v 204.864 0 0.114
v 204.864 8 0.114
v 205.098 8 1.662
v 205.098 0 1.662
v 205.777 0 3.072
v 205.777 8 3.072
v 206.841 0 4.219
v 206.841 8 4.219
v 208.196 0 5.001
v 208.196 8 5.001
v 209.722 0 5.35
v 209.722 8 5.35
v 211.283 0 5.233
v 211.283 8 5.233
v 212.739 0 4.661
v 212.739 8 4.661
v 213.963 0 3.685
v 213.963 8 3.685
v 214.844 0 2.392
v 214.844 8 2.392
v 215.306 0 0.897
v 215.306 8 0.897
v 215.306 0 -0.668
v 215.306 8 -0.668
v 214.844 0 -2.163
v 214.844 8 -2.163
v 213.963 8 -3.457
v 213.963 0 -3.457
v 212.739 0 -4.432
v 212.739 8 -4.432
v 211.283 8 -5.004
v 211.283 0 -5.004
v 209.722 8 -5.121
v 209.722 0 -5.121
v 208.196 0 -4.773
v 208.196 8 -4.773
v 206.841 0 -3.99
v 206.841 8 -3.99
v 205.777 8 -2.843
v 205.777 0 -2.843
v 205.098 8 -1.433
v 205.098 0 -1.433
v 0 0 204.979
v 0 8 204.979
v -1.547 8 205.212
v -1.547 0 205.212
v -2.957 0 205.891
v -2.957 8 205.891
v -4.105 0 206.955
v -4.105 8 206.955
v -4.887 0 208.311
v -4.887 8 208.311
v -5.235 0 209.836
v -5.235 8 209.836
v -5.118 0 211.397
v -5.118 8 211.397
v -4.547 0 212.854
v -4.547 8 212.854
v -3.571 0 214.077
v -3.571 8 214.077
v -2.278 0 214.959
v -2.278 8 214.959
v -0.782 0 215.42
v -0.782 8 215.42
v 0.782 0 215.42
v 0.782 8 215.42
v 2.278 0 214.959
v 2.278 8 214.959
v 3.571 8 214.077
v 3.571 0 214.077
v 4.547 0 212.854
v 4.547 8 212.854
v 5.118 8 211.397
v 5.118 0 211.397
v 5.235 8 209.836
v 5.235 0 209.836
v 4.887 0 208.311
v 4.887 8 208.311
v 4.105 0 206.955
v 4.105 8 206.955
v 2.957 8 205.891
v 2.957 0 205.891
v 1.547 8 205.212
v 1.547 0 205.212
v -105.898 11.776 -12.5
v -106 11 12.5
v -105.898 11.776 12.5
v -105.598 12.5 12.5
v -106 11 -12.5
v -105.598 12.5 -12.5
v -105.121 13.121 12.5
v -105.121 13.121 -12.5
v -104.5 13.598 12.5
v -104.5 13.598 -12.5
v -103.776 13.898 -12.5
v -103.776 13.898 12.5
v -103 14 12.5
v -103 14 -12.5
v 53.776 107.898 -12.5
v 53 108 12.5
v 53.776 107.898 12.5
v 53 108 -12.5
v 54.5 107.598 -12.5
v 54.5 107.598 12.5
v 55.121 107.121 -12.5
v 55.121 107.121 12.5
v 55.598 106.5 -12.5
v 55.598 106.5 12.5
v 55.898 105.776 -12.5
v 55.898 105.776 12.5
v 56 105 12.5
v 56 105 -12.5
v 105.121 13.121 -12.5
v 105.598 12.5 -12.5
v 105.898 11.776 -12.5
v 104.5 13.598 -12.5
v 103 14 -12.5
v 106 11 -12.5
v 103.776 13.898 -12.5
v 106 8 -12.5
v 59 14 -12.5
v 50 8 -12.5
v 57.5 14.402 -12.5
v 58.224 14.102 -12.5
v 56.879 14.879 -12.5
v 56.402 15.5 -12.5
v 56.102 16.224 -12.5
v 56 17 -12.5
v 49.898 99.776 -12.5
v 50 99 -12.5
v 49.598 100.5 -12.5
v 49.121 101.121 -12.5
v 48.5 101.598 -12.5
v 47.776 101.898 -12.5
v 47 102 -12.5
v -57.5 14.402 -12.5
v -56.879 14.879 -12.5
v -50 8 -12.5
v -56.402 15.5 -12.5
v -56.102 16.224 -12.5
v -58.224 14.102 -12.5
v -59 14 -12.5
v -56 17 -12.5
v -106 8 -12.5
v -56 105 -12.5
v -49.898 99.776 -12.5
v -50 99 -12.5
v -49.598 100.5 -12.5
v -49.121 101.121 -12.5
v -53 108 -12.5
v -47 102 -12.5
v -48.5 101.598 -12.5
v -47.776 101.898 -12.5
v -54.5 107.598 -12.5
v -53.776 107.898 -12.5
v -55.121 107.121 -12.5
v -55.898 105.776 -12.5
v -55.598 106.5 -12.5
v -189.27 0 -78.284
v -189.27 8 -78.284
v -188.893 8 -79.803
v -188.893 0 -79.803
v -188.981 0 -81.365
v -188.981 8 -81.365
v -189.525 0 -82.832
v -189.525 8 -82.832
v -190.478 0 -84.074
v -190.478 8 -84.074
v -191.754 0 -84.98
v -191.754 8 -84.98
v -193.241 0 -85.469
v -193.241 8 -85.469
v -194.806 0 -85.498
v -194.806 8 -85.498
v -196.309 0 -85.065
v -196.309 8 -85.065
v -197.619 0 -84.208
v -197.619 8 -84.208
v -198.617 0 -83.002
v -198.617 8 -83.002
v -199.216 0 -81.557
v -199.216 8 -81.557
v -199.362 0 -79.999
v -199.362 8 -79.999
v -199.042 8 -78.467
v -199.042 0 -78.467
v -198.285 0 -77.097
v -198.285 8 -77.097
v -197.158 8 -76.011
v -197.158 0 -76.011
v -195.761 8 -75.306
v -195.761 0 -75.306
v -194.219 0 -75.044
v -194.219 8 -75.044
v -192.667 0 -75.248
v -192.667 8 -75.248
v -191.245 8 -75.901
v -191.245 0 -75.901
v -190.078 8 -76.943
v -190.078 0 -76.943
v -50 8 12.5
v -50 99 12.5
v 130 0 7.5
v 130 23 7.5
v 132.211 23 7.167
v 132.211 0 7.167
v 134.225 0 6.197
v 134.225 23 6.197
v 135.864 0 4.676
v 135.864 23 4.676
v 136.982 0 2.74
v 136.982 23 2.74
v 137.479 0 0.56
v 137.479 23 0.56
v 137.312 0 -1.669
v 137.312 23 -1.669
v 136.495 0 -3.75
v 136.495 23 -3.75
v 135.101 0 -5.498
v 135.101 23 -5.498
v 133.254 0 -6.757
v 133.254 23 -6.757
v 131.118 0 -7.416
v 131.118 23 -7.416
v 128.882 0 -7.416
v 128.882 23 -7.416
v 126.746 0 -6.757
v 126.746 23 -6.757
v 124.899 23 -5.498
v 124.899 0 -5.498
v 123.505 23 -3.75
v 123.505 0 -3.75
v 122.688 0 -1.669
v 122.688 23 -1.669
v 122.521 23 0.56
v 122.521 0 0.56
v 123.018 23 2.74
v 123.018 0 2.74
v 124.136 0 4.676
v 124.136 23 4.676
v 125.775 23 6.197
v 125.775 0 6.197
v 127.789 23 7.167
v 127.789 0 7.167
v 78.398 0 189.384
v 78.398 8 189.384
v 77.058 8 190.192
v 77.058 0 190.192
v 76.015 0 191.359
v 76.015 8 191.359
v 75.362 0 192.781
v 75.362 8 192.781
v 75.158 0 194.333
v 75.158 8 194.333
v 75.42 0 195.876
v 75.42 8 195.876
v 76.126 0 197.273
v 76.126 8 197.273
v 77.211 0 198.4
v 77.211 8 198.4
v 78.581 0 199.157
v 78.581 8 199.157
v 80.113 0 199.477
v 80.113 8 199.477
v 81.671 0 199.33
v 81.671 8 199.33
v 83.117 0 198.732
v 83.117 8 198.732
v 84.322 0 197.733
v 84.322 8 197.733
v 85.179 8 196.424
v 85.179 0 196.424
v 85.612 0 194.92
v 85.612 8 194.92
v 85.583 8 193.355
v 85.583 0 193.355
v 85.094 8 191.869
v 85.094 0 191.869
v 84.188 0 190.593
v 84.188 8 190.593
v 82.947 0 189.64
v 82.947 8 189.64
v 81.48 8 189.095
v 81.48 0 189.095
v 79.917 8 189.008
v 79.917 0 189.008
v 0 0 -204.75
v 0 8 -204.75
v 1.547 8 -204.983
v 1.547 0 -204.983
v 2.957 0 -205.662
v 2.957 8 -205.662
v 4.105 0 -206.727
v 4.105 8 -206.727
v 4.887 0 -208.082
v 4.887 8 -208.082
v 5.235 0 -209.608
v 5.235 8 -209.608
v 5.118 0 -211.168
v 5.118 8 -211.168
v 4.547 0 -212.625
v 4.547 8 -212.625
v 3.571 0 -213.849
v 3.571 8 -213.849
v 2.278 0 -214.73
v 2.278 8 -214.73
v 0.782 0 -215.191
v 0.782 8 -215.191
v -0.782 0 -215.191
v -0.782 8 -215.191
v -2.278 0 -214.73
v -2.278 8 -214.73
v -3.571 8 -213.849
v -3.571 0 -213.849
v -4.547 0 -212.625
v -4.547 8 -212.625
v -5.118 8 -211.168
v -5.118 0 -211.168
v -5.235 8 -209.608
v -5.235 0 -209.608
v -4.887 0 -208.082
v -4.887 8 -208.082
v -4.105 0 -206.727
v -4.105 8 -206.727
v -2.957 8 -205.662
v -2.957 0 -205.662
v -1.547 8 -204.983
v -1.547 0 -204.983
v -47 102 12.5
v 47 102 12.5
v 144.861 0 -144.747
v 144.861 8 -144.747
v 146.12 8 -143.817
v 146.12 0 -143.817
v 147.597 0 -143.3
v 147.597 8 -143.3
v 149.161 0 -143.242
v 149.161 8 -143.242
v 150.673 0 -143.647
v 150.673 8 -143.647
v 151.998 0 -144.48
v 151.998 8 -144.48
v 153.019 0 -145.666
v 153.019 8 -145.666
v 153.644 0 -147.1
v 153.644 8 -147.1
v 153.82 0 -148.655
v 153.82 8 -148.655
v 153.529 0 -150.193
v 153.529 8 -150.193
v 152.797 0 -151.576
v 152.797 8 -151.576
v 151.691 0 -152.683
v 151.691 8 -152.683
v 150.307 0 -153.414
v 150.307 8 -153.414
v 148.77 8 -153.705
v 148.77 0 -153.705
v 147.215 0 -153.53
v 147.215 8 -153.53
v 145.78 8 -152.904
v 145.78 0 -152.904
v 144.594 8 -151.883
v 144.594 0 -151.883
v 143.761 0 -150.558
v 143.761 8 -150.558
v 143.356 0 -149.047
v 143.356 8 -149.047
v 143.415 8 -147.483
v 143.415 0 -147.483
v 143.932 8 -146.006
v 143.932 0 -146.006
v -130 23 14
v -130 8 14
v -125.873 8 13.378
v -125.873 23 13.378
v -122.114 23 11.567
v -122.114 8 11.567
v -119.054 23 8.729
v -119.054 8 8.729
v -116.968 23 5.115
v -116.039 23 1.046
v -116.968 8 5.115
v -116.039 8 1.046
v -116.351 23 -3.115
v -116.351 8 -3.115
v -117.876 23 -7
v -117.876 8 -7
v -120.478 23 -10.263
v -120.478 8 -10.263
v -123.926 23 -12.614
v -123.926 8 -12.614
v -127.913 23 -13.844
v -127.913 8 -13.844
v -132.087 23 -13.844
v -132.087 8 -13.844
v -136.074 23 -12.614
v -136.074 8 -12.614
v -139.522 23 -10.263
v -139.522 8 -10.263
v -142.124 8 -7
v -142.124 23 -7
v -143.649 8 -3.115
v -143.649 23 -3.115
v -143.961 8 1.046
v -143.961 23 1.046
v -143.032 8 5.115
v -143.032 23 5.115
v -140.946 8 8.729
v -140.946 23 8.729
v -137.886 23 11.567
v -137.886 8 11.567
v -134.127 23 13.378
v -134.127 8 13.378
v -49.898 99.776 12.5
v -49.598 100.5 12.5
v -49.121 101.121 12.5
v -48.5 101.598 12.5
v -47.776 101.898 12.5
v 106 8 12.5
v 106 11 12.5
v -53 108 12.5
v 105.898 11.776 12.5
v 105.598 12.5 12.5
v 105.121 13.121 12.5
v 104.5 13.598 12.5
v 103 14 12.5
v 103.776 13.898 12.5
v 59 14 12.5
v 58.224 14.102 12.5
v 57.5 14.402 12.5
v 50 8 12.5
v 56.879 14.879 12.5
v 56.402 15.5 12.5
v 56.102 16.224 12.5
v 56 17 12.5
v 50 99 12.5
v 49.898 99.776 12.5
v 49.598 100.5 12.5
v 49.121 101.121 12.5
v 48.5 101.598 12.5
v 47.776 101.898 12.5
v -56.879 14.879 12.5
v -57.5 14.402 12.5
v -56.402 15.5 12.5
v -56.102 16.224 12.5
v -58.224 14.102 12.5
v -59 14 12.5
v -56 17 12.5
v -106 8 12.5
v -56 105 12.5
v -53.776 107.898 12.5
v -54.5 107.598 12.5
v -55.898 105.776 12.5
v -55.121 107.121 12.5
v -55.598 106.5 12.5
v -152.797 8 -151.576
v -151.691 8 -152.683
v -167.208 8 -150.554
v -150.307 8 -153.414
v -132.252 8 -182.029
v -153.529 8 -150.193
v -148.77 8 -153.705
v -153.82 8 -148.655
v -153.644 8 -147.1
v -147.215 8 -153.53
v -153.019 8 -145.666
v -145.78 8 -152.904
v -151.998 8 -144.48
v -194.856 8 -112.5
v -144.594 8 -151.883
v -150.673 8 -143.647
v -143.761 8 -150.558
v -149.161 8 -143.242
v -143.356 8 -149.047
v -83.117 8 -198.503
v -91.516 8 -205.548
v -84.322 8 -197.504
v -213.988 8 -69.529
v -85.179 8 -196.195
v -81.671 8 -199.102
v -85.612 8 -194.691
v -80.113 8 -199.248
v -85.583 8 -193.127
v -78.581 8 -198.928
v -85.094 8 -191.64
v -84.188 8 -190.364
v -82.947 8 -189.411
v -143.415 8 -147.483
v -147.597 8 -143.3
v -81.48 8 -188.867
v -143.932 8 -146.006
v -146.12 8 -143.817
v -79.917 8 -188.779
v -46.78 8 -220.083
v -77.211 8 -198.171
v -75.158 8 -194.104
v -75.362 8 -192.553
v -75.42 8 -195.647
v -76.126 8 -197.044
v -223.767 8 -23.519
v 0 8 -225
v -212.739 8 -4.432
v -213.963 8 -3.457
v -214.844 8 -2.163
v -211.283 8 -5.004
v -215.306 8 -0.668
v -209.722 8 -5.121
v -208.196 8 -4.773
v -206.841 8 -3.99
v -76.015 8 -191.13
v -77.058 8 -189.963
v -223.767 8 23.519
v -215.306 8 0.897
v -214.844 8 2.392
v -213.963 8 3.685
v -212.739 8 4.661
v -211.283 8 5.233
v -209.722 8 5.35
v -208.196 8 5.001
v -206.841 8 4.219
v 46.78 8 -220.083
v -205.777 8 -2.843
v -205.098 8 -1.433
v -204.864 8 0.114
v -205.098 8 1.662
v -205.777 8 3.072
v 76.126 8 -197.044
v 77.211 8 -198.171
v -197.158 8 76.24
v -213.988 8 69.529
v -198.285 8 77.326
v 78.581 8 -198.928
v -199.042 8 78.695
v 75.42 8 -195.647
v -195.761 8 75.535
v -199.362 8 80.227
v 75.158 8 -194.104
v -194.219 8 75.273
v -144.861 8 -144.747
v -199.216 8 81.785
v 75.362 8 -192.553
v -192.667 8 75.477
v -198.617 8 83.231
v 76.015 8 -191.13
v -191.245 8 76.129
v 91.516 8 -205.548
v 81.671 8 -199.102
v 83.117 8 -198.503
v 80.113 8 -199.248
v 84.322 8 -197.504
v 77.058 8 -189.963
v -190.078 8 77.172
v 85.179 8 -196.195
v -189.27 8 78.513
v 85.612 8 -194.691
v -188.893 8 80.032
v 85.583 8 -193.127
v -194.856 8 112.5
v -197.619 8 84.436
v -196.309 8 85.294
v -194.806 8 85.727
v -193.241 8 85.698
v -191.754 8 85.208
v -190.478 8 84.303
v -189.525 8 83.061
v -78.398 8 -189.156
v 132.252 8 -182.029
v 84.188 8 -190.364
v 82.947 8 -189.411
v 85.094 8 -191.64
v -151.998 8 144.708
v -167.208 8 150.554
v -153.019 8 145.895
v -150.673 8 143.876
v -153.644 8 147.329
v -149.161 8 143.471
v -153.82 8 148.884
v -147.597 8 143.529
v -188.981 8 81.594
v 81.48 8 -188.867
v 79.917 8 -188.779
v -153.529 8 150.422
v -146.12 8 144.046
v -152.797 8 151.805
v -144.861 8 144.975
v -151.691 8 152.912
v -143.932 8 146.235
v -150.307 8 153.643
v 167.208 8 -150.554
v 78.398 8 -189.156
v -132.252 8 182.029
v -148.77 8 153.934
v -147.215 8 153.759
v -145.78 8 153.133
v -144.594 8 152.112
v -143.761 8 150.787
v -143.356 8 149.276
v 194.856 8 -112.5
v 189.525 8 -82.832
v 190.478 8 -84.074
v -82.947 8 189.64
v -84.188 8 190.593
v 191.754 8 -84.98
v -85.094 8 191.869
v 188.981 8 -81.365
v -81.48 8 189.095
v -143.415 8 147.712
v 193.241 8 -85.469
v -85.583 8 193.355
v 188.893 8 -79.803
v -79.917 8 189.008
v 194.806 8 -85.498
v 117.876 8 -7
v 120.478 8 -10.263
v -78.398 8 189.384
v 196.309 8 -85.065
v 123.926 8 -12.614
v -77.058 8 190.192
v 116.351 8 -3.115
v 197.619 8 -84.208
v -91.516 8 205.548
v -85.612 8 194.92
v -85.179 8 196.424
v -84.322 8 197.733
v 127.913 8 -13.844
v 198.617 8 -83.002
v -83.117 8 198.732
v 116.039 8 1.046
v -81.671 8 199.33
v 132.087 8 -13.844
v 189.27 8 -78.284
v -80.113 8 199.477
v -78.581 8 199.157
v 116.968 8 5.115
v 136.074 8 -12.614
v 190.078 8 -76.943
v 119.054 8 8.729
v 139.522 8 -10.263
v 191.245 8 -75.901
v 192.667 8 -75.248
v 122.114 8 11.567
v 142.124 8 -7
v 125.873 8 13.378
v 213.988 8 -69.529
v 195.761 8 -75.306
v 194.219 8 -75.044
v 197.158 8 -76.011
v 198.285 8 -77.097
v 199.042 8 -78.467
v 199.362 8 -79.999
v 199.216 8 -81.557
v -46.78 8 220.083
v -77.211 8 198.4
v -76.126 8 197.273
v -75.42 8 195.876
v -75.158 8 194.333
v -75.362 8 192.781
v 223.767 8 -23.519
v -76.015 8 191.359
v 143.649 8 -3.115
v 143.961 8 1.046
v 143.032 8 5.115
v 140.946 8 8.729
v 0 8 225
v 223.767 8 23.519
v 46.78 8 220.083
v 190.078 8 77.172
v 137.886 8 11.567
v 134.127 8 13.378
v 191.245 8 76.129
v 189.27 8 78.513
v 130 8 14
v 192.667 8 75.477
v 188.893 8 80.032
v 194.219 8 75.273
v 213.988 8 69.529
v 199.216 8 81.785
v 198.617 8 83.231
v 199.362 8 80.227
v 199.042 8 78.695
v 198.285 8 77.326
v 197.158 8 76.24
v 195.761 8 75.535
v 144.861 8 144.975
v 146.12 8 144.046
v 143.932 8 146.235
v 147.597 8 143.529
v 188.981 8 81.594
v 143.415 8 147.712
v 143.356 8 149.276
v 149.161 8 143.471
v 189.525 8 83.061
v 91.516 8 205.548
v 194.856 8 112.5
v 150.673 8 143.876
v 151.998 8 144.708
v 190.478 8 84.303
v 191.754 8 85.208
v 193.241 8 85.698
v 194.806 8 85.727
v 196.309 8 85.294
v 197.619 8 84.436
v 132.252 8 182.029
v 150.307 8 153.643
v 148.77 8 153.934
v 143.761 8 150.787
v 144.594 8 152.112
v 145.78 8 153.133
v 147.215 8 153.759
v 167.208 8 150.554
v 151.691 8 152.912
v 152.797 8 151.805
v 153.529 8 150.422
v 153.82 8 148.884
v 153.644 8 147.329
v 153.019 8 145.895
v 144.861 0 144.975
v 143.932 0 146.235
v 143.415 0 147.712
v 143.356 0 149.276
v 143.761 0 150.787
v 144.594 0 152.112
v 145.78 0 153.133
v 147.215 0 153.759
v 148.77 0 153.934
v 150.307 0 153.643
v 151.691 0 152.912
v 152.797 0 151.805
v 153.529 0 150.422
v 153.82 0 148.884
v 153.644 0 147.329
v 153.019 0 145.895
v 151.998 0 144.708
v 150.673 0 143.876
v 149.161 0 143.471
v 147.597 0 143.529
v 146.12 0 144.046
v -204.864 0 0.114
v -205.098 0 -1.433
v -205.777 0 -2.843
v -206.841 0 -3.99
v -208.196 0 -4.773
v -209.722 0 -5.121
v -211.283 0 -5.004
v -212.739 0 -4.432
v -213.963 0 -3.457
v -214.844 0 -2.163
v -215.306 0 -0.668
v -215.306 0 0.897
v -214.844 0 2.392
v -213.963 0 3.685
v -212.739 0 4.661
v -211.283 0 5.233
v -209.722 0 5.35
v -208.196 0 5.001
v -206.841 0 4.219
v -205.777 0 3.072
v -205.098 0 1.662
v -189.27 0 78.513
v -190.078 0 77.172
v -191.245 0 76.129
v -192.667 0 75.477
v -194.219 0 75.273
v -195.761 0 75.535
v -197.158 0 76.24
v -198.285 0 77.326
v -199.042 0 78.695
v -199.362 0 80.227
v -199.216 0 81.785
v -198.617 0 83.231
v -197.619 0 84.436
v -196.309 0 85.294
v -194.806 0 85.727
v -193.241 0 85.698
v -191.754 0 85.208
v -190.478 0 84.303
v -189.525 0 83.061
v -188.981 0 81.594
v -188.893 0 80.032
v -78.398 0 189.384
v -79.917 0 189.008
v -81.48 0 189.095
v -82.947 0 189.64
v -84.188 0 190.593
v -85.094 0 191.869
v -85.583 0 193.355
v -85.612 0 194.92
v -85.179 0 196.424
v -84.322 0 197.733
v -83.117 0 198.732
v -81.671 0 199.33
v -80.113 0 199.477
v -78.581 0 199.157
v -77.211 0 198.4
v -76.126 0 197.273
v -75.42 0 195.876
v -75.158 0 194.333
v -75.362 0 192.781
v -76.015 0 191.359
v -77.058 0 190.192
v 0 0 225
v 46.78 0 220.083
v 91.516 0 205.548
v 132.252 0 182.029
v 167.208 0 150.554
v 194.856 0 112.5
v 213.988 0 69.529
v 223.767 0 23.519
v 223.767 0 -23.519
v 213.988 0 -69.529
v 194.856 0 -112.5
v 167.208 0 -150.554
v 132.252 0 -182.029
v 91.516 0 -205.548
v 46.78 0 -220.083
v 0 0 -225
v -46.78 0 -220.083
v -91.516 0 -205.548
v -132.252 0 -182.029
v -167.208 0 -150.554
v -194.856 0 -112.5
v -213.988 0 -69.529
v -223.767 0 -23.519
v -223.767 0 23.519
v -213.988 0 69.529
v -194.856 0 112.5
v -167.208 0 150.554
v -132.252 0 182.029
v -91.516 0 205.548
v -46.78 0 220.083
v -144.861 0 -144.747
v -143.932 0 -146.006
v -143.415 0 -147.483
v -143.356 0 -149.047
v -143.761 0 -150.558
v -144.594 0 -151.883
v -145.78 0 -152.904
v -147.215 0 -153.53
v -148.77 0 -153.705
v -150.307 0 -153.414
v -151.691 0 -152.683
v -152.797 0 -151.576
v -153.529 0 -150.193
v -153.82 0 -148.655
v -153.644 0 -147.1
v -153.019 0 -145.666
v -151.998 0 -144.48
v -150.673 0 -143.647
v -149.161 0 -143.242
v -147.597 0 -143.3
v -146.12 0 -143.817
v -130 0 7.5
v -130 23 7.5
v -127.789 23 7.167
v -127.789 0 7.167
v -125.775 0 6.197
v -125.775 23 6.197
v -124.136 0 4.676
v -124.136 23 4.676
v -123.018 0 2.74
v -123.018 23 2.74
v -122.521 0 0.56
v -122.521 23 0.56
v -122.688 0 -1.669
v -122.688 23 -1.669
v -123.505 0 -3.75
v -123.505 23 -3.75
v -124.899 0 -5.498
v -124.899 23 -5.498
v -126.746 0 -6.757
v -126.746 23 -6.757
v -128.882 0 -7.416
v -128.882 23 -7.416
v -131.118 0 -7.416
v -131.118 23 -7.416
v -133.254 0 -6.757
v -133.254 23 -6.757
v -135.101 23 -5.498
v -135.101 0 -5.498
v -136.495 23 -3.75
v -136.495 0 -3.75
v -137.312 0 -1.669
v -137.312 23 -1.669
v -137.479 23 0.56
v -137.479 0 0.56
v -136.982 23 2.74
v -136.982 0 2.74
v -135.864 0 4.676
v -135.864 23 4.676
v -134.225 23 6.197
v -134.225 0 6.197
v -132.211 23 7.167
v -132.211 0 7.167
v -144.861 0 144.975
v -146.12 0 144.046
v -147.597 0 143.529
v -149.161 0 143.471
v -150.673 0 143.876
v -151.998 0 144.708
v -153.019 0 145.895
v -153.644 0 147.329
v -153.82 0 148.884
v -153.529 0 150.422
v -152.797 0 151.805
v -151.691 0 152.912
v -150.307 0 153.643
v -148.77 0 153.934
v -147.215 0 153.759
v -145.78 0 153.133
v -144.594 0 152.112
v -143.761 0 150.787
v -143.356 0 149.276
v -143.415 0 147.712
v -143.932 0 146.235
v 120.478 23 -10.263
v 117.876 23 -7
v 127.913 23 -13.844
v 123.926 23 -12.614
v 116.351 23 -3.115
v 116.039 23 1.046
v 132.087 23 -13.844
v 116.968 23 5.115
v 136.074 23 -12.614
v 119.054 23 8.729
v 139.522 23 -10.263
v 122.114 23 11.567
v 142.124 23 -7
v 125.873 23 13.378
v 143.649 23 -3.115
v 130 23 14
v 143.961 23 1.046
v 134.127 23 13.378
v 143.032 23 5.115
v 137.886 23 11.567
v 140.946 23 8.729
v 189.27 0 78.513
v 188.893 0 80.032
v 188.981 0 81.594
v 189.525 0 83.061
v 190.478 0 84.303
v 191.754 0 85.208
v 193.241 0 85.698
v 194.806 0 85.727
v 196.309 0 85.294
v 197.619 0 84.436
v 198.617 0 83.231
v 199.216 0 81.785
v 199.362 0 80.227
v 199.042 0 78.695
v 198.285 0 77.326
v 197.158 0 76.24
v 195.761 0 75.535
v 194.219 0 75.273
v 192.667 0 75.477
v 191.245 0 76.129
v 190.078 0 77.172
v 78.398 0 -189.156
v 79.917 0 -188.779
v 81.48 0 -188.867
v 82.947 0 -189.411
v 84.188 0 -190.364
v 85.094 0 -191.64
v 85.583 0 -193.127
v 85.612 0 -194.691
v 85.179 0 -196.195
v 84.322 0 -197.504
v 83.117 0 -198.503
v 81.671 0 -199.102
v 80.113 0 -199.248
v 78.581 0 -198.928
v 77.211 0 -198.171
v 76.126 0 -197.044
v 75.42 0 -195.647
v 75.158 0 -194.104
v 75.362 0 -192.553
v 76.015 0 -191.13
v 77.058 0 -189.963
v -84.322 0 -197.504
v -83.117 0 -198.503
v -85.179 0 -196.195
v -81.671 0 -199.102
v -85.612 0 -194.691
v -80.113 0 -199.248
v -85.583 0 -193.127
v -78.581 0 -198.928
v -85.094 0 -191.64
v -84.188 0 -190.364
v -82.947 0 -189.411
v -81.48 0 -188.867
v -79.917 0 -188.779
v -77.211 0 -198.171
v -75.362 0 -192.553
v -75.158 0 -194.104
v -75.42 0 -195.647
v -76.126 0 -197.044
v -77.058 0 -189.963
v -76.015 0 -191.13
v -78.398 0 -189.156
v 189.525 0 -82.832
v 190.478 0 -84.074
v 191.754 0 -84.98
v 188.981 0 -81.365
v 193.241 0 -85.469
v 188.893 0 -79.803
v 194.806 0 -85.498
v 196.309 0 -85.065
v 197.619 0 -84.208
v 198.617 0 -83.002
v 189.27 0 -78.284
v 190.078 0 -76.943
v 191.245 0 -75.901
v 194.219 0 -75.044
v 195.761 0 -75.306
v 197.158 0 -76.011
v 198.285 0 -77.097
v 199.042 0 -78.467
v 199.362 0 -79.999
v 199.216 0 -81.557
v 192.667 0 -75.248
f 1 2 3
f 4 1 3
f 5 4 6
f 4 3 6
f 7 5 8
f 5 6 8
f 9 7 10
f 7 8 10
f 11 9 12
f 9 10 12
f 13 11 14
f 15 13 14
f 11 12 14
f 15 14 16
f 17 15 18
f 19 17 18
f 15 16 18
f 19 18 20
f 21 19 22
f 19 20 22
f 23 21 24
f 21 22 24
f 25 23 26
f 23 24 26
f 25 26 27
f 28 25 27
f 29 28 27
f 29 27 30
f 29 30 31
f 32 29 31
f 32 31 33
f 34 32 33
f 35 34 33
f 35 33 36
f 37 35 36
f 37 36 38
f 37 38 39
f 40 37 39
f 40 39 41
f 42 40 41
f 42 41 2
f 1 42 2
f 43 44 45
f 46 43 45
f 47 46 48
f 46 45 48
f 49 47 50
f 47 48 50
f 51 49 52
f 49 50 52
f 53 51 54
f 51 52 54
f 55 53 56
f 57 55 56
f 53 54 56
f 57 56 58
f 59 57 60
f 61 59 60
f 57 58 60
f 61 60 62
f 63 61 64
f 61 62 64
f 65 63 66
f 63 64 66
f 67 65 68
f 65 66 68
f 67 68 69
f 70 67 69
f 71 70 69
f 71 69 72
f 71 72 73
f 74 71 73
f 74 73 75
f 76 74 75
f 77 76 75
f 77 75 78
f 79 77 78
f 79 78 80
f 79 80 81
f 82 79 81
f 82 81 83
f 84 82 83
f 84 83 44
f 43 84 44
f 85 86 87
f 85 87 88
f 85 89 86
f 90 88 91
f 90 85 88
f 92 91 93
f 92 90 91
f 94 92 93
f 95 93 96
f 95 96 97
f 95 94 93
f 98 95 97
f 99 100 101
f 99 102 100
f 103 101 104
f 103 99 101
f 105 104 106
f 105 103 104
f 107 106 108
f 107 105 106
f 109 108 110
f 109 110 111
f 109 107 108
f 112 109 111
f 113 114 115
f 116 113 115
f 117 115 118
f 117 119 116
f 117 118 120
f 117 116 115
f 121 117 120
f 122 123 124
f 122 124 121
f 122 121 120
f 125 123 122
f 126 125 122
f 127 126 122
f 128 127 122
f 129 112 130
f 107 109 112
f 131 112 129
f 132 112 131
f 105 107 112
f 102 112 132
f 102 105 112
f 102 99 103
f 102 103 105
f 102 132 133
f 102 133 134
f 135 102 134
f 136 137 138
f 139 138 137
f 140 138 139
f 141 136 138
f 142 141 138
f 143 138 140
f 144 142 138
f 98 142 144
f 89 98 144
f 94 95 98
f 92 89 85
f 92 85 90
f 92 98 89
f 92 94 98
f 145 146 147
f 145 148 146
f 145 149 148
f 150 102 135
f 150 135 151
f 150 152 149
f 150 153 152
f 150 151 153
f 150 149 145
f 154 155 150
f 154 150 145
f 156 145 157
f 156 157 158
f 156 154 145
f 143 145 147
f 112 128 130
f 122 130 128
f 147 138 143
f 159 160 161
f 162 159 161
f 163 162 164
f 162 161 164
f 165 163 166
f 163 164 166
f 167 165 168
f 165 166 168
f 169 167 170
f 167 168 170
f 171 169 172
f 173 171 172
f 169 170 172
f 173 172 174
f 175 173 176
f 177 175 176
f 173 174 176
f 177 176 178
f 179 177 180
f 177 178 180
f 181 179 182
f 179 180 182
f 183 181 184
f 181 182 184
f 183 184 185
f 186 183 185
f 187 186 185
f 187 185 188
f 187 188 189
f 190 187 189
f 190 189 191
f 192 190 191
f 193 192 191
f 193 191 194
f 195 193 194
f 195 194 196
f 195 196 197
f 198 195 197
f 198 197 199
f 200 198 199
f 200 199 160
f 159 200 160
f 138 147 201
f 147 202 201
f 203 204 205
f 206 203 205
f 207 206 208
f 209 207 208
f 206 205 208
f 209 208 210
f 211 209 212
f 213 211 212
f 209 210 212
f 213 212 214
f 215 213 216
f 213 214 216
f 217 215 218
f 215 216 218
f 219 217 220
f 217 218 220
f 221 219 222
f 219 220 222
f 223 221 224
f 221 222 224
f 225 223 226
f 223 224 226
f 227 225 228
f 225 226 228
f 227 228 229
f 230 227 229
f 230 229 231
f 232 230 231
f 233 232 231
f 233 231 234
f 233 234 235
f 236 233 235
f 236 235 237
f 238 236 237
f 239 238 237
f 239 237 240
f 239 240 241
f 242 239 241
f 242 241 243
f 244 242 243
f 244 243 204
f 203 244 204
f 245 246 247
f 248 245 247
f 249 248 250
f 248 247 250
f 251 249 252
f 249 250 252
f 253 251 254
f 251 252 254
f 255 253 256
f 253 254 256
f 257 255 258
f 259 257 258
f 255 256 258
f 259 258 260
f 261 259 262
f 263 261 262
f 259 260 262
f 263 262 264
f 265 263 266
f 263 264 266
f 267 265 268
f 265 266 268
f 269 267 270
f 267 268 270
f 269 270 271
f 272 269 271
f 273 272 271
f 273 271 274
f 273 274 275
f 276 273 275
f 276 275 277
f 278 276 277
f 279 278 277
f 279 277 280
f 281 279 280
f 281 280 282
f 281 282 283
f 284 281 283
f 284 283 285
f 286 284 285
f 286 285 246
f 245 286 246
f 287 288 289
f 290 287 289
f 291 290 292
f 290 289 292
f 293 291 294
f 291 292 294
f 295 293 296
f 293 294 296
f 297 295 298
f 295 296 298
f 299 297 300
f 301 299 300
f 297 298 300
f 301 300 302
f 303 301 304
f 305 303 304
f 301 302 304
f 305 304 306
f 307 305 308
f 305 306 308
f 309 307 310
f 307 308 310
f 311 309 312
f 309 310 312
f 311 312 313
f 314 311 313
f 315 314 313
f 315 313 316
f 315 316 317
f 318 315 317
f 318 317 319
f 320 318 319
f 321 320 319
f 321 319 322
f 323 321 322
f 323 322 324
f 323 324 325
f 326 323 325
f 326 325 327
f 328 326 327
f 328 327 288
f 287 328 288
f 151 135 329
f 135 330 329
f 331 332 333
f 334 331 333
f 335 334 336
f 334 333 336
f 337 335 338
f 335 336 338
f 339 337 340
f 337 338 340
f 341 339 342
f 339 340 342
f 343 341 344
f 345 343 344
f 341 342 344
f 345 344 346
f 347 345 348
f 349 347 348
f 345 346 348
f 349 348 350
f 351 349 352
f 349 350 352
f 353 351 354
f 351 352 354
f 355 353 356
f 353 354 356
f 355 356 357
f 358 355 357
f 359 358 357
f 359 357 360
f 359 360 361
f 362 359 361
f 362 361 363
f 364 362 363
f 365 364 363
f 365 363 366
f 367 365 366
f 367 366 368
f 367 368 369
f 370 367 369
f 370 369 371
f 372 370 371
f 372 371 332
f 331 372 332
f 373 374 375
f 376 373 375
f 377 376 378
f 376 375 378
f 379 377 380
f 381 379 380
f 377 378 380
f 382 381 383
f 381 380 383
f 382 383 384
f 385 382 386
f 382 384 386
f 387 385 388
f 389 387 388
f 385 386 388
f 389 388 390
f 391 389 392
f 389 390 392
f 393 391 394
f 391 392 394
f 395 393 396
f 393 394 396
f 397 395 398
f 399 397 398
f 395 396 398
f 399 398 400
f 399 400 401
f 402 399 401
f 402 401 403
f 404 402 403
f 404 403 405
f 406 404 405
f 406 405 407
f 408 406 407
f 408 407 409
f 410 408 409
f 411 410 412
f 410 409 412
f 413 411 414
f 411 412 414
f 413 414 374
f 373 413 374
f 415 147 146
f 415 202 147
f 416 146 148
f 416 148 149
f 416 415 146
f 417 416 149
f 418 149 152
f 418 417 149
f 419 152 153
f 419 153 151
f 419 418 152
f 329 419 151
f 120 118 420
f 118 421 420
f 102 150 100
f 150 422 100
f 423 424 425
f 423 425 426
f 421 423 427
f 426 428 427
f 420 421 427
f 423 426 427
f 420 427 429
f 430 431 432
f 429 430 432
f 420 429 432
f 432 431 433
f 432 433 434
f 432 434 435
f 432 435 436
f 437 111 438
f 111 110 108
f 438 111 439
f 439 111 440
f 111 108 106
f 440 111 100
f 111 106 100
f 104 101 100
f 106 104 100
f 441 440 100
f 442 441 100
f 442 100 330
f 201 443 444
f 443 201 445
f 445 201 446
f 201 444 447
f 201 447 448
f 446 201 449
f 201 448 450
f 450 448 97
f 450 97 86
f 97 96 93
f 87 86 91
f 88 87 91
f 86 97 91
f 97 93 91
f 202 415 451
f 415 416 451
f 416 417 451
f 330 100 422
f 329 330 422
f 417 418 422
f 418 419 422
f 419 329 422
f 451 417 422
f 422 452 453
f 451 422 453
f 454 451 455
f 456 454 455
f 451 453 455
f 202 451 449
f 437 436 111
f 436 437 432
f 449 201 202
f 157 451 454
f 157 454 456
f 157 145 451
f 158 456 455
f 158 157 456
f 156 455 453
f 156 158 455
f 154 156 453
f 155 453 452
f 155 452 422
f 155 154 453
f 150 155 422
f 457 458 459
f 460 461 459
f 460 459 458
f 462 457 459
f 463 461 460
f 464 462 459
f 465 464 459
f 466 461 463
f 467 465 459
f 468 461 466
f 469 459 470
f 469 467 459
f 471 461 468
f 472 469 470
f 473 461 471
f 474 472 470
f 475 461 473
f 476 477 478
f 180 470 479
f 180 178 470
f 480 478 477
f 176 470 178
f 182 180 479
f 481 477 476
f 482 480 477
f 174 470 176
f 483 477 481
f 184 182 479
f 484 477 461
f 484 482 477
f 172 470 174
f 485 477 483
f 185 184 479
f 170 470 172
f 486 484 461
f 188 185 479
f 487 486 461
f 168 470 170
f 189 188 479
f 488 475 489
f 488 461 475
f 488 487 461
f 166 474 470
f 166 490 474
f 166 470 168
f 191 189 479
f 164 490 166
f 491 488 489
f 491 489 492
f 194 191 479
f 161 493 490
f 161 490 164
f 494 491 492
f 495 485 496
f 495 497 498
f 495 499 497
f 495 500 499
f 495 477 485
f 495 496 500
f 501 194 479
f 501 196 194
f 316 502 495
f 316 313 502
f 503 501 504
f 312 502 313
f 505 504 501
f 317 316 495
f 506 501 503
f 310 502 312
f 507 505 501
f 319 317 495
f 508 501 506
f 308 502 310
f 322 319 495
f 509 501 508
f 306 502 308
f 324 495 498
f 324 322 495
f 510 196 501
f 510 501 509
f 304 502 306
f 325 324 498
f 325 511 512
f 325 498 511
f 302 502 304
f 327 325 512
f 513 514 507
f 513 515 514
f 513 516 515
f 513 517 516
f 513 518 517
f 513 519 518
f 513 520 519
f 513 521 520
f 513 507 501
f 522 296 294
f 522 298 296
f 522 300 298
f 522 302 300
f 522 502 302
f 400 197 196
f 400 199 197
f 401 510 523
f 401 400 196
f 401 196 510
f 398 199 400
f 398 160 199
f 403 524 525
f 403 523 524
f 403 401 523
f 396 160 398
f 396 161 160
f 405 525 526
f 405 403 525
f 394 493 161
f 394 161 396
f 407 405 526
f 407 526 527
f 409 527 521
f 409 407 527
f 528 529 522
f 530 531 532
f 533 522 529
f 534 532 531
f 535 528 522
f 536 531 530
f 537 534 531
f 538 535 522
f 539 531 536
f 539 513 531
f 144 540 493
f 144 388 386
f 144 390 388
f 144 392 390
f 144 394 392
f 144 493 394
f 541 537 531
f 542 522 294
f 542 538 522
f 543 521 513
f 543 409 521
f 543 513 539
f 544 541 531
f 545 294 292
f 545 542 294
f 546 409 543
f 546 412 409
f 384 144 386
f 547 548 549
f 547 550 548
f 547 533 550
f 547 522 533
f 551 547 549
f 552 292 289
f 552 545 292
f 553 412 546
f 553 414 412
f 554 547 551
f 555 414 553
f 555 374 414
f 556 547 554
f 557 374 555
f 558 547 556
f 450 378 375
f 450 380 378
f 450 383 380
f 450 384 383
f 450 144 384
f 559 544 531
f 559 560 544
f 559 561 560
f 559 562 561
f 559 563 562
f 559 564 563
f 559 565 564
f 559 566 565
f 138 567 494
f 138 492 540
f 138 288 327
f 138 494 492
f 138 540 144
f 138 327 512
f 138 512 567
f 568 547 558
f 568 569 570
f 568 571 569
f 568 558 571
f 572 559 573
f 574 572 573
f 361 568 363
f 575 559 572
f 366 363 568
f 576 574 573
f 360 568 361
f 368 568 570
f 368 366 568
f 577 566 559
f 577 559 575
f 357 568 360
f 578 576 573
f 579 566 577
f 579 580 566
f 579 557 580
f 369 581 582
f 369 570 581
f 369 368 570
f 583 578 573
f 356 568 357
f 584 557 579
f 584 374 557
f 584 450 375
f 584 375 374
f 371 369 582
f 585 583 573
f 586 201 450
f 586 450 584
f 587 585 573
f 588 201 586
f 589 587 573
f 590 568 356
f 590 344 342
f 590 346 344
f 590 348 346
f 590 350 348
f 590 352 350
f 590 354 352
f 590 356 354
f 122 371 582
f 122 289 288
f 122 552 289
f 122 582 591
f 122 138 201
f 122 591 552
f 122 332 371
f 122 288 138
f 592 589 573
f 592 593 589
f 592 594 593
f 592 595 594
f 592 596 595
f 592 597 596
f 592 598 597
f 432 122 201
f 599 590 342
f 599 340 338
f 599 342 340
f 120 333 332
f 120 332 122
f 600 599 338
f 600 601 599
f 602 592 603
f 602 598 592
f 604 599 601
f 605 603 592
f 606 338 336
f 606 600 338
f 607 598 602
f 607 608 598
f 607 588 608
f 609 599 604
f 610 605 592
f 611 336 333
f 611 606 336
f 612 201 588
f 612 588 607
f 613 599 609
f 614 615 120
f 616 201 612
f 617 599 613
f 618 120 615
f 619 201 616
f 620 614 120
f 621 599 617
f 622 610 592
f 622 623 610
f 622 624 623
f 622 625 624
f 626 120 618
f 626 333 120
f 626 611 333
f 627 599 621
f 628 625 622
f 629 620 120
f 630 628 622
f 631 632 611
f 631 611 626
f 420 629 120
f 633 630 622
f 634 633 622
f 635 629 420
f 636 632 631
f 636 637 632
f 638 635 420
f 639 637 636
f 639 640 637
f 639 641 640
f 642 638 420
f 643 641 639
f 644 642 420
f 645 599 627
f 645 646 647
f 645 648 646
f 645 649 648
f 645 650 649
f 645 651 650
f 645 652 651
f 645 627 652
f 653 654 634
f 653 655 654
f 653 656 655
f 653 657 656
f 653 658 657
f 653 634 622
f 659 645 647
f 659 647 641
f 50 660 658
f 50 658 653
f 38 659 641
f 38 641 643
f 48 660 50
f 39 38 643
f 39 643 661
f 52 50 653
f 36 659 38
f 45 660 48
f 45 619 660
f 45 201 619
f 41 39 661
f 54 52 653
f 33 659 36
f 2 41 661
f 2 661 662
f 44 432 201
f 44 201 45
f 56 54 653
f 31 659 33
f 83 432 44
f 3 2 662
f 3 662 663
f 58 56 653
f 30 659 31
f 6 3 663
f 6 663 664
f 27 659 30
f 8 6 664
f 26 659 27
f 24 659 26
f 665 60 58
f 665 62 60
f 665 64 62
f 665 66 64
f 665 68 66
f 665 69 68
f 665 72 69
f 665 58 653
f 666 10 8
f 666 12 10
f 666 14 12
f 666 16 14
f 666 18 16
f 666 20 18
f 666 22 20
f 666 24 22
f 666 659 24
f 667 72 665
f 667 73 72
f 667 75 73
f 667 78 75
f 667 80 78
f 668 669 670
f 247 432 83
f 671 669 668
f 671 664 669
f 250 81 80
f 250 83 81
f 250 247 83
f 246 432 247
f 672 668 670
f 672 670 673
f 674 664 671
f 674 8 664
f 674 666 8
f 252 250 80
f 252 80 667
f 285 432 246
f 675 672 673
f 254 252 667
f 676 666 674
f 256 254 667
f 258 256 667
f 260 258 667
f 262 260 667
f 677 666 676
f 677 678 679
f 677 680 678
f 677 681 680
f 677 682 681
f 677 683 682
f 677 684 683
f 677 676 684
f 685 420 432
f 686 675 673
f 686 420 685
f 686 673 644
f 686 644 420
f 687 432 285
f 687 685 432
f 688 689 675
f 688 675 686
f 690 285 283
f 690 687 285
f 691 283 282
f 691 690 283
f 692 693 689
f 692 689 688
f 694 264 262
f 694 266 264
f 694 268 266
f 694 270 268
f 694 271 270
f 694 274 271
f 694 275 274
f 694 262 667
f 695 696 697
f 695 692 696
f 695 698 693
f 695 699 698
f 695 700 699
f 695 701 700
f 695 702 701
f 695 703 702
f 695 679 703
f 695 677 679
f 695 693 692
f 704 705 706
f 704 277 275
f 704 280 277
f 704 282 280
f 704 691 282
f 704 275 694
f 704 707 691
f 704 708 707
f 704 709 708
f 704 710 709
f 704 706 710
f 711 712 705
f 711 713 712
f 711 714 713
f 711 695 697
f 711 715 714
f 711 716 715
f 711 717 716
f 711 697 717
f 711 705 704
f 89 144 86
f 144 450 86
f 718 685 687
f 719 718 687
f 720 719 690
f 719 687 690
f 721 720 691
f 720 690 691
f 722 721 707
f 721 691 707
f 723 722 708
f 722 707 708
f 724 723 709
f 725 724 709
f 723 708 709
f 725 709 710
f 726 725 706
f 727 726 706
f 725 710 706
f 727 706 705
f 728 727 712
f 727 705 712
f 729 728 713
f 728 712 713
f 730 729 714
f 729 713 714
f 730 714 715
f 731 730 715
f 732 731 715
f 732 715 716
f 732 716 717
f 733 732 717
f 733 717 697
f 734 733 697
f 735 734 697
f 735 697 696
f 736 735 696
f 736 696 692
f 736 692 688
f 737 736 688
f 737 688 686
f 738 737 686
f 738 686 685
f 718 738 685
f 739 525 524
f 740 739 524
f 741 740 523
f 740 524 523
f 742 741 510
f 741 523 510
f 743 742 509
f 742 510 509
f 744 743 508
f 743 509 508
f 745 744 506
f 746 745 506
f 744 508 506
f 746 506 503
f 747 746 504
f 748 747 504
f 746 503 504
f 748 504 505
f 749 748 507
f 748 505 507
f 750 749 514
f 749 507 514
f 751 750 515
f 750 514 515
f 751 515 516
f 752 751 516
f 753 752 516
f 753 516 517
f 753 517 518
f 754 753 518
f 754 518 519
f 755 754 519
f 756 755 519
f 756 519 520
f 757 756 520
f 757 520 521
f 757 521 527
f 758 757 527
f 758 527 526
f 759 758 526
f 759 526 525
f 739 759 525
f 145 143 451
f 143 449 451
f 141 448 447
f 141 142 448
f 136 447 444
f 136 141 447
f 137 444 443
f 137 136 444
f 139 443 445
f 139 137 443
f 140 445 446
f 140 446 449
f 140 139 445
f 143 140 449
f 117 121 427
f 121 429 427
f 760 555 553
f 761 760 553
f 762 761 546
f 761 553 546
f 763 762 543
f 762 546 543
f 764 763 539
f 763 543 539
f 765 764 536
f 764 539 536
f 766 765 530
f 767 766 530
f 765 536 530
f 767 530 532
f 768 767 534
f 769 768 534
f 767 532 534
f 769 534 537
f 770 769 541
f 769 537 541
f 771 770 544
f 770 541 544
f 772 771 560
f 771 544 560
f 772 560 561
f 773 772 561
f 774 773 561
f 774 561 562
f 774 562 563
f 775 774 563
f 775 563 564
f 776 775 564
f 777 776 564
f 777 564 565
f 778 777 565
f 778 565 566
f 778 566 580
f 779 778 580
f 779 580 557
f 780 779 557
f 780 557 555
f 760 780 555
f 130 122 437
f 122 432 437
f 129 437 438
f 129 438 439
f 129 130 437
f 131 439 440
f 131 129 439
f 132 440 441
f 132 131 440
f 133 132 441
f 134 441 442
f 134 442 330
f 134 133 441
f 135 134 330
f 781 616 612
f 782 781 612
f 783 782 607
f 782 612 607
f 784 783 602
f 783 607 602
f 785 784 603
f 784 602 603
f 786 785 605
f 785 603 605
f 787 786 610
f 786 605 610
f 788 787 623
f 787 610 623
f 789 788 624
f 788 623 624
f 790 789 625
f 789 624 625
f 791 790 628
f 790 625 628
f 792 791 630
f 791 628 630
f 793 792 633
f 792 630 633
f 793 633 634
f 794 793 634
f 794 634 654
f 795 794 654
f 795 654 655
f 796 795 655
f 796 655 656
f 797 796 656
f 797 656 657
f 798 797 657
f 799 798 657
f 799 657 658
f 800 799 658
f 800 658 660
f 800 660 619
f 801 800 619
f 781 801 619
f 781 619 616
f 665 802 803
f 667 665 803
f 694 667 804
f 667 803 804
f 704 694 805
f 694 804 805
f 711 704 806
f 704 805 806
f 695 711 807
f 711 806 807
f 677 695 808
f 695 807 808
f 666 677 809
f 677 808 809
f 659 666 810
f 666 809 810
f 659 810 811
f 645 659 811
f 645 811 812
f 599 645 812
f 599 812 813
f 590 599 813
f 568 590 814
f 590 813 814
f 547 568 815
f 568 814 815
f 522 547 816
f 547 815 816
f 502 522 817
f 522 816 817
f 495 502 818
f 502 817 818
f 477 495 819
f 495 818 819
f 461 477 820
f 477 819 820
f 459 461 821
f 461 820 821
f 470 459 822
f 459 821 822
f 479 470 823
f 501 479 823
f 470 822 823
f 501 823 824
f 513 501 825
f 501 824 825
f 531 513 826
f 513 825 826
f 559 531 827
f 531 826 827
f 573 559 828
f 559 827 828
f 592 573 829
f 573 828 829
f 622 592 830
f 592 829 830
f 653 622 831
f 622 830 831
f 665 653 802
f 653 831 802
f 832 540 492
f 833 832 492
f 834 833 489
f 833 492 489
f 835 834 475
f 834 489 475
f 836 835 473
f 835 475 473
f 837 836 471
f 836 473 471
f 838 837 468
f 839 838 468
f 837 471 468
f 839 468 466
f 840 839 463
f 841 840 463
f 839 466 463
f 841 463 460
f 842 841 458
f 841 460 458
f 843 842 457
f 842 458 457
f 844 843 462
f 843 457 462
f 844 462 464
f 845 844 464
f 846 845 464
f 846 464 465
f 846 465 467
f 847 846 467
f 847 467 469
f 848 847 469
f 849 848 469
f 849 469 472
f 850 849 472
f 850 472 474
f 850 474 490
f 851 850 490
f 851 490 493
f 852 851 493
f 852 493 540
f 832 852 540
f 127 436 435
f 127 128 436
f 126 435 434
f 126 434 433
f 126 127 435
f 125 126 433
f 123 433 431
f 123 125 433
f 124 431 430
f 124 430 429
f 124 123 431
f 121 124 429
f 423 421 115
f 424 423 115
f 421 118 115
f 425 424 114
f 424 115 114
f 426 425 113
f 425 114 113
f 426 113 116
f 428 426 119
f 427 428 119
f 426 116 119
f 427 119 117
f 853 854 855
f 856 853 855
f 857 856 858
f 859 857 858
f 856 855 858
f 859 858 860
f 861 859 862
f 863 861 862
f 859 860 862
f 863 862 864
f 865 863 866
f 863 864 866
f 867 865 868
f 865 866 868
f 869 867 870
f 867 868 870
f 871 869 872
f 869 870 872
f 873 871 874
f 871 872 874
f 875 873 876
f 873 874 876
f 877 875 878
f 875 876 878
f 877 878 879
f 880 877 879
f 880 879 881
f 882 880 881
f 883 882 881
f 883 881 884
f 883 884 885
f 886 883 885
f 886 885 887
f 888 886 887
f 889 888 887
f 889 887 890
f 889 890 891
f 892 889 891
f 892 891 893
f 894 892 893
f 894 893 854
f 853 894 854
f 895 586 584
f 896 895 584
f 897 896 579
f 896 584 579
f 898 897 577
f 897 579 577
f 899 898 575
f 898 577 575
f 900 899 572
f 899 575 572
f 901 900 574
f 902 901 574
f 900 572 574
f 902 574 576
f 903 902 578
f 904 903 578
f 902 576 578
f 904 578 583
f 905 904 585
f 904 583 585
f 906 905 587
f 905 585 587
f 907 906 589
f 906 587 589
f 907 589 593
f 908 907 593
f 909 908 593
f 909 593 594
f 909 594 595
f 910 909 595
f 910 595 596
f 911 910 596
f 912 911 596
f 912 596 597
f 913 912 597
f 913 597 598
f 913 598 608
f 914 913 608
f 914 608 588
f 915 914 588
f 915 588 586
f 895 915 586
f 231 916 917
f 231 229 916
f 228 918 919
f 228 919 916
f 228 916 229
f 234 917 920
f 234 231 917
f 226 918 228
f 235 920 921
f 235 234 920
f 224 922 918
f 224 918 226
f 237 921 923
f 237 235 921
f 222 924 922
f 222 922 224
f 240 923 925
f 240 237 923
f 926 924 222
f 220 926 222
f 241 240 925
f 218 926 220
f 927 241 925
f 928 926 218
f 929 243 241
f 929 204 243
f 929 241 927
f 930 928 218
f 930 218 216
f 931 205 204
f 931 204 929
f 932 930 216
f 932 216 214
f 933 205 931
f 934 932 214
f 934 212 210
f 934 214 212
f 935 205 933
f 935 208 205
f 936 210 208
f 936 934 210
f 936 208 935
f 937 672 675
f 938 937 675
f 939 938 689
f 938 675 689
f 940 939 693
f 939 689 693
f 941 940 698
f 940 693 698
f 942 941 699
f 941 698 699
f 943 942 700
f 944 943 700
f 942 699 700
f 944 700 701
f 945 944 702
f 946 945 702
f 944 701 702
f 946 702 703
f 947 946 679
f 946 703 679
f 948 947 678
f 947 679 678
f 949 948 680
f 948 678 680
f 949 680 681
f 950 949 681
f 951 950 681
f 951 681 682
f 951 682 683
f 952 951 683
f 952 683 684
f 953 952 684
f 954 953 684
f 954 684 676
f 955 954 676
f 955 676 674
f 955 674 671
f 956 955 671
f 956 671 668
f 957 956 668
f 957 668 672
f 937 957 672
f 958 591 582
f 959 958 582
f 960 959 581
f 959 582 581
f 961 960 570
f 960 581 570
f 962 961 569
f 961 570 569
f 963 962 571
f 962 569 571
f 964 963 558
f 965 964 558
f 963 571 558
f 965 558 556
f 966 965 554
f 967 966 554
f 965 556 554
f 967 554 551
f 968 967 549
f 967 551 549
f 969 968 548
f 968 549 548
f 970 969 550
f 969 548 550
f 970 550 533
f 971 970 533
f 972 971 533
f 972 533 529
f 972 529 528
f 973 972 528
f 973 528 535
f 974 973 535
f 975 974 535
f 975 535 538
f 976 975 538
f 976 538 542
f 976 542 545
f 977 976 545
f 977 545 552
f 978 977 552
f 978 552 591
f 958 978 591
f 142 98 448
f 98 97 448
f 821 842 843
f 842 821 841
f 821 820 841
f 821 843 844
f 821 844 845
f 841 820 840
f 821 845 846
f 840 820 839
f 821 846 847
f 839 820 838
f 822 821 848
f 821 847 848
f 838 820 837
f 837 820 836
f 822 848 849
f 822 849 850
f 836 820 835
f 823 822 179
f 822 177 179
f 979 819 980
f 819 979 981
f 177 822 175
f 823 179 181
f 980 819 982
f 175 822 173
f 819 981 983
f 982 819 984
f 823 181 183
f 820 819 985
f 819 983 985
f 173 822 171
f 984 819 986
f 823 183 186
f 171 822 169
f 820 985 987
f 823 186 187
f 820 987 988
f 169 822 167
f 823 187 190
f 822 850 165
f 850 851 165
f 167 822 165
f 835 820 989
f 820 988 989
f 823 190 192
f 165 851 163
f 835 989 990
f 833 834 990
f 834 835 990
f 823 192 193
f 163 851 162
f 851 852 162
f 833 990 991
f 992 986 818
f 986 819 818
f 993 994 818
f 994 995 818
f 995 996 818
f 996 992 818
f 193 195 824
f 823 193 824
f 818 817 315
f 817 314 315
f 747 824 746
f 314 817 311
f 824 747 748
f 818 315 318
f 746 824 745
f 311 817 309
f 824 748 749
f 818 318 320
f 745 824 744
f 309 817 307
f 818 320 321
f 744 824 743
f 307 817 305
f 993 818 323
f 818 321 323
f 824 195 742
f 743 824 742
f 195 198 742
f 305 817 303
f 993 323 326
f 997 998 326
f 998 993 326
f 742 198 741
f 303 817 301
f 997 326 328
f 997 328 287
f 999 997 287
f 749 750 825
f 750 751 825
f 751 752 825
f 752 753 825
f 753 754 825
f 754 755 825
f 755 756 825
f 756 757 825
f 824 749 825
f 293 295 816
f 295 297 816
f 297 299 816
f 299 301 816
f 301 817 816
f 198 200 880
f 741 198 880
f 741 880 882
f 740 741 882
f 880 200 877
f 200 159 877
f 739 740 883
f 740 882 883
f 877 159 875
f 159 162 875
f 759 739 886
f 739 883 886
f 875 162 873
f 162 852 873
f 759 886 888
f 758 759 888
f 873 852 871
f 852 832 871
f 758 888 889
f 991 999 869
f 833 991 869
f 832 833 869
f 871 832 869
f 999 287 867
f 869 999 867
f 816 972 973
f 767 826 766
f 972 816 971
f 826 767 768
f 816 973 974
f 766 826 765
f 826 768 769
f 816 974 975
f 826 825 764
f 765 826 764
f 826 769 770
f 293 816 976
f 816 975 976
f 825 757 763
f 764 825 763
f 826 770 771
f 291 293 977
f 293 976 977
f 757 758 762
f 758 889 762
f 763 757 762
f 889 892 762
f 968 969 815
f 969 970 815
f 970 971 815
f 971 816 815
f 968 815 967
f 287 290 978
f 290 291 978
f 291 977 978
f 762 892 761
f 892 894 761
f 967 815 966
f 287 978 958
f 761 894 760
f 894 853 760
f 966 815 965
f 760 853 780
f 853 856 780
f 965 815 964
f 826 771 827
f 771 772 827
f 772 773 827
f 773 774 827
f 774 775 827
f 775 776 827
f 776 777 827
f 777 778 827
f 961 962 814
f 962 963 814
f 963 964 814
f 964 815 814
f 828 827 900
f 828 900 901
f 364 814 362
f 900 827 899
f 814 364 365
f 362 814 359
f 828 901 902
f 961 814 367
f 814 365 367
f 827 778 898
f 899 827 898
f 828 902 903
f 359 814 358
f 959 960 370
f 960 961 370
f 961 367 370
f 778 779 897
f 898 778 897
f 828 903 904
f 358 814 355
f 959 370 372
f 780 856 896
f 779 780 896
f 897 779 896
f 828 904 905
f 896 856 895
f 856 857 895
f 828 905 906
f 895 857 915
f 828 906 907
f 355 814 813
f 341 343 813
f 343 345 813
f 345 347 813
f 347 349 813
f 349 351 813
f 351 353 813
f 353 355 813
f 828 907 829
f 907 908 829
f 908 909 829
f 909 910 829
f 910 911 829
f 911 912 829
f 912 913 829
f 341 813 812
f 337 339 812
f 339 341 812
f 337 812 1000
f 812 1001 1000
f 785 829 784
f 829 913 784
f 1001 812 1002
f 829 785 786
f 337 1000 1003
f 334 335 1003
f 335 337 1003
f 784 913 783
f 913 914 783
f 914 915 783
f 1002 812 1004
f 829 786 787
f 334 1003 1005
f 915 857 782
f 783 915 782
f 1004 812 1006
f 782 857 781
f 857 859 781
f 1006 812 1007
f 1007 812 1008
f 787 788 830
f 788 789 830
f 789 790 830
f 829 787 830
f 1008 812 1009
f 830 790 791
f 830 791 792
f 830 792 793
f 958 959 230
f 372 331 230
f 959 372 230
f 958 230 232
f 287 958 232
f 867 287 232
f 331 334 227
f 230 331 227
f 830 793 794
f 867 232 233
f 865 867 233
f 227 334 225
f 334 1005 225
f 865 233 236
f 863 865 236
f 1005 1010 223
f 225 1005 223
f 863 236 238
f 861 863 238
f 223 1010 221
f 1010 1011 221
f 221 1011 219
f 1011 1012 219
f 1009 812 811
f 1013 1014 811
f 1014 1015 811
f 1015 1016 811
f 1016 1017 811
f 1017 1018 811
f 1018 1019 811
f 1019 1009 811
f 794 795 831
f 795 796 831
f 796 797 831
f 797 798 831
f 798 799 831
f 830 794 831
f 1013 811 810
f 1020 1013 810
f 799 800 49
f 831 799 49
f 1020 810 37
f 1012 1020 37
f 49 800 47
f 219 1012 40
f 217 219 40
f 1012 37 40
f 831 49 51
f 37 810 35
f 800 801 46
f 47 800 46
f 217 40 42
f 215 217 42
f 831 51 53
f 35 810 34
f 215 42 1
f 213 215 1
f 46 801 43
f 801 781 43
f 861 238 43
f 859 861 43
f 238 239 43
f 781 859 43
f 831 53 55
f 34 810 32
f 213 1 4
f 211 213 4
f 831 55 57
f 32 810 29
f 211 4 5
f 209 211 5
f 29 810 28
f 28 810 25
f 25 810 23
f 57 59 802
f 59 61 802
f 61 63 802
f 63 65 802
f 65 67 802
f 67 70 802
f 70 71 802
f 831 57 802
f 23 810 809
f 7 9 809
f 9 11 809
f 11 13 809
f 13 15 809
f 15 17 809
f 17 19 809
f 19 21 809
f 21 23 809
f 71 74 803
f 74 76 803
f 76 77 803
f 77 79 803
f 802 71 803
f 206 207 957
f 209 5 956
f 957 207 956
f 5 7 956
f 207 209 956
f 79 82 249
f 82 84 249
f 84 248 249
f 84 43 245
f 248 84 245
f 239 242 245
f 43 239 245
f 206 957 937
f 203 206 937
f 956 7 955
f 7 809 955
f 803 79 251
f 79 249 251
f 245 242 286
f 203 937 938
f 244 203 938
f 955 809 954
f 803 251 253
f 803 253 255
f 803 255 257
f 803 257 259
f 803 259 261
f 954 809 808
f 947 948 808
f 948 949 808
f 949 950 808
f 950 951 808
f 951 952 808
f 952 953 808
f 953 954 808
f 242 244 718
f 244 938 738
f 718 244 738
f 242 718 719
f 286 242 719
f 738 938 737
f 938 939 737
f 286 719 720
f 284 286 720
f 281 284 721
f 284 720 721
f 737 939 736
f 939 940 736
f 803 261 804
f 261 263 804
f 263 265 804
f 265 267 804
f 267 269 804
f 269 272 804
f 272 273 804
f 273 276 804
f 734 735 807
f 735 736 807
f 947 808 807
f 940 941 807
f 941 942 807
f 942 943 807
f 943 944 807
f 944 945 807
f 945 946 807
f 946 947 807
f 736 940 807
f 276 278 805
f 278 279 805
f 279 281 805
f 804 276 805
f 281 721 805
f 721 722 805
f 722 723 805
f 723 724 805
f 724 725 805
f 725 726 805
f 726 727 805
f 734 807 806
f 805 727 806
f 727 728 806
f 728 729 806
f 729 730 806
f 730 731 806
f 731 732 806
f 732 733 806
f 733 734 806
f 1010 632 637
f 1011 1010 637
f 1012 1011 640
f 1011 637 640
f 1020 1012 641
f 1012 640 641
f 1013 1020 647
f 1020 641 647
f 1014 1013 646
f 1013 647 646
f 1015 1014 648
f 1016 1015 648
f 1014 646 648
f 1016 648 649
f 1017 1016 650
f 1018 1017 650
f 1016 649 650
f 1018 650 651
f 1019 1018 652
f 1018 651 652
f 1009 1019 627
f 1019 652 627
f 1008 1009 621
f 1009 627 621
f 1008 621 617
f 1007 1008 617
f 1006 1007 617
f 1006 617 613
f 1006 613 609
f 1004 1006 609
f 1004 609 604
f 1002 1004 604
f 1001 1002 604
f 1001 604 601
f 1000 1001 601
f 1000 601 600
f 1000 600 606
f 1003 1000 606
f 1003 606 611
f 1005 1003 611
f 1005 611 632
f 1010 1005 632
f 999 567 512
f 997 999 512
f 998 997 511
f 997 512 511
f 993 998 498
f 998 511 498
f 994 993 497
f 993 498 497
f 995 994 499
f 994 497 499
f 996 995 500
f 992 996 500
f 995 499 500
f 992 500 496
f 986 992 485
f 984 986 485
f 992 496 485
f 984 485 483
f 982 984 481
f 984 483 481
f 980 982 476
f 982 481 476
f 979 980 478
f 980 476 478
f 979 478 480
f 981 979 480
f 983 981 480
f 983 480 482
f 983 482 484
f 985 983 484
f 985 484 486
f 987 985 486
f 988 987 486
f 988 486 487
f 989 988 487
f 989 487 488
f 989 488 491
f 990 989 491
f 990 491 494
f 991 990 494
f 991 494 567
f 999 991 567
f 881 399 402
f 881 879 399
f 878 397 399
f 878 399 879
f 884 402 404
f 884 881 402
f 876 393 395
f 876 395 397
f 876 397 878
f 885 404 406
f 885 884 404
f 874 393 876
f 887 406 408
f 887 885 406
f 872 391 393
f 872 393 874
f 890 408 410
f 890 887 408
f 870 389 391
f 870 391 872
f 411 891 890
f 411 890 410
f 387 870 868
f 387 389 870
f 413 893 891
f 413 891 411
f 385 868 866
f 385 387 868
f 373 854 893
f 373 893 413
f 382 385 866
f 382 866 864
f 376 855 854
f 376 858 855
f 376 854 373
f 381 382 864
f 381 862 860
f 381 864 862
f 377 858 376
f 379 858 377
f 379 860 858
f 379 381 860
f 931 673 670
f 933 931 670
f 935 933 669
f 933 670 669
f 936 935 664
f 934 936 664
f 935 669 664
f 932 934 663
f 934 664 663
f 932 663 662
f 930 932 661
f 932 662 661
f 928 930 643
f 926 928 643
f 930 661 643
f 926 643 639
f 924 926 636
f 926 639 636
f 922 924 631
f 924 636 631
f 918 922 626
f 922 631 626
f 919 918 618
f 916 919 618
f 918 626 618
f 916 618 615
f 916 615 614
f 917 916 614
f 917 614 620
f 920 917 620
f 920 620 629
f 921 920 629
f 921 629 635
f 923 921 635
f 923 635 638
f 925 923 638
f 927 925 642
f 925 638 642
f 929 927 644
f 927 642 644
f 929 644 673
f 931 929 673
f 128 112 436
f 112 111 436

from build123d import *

# Parameters (mm, degrees)
SKETCH1_R           = 225
BOSS_EXTRUDE1_DEPTH = 8
SKETCH2_R           = 5.25
CUT_EXTRUDE1_DEPTH  = 319.298601945
CIRPATTERN1_COUNT   = 16
SKETCH3_R           = 14
BOSS_EXTRUDE2_DEPTH = 15
SKETCH4_R           = 7.5
CUT_EXTRUDE2_DEPTH  = 320.028211919
SKETCH5_R           = 14
BOSS_EXTRUDE3_DEPTH = 15
SKETCH6_R           = 7.5
CUT_EXTRUDE3_DEPTH  = 320.028211919
BOSS_EXTRUDE4_DEPTH = 12.5
FILLET1_R           = 3


with BuildPart() as part:
    # Sketch1 → Boss-Extrude1 (new body)
    with BuildSketch(Plane(origin=(0, 0, 0), x_dir=(1, 0, 0), z_dir=(0, 1, 0))):
        with Locations(Location((0, 0, 0), (0, 0, 270))):
            Circle(SKETCH1_R)
    extrude(amount=BOSS_EXTRUDE1_DEPTH)

    # Sketch2 → Cut-Extrude1 (cut, through all)
    with BuildSketch(Plane(origin=(0, 8, 0), x_dir=(1, 0, 0), z_dir=(0, 1, 0))):
        with Locations(Location((0, 210, 0), (0, 0, 270))):
            Circle(SKETCH2_R)
    cut_extrude1 = extrude(amount=-CUT_EXTRUDE1_DEPTH, mode=Mode.SUBTRACT)

    # CirPattern1: Cut-Extrude1 ×16 about axis
    cirpattern1_axis = Axis((0, 0, 0.114395615), (0, 1, 0))
    for i in range(1, CIRPATTERN1_COUNT):
        add(cut_extrude1.rotate(cirpattern1_axis, i * 360 / CIRPATTERN1_COUNT), mode=Mode.SUBTRACT)

    # Sketch3 → Boss-Extrude2 (add)
    with BuildSketch(Plane(origin=(0, 8, 0), x_dir=(1, 0, 0), z_dir=(0, 1, 0))):
        with Locations(Location((-130, 0, 0), (0, 0, 270))):
            Circle(SKETCH3_R)
    extrude(amount=BOSS_EXTRUDE2_DEPTH)

    # Sketch4 → Cut-Extrude2 (cut, through all)
    with BuildSketch(Plane(origin=(0, 23, 0), x_dir=(1, 0, 0), z_dir=(0, 1, 0))):
        with Locations(Location((-130, 0, 0), (0, 0, 270))):
            Circle(SKETCH4_R)
    extrude(amount=-CUT_EXTRUDE2_DEPTH, mode=Mode.SUBTRACT)

    # Sketch5 → Boss-Extrude3 (add)
    with BuildSketch(Plane(origin=(0, 8, 0), x_dir=(1, 0, 0), z_dir=(0, 1, 0))):
        with Locations(Location((130, 0, 0), (0, 0, 270))):
            Circle(SKETCH5_R)
    extrude(amount=BOSS_EXTRUDE3_DEPTH)

    # Sketch6 → Cut-Extrude3 (cut, through all)
    with BuildSketch(Plane(origin=(0, 23, 0), x_dir=(1, 0, 0), z_dir=(0, 1, 0))):
        with Locations(Location((130, 0, 0), (0, 0, 270))):
            Circle(SKETCH6_R)
    extrude(amount=-CUT_EXTRUDE3_DEPTH, mode=Mode.SUBTRACT)

    # Sketch7 → Boss-Extrude4 (add, symmetric)
    with BuildSketch(Plane.XY):
        Polygon((-106, 8), (-106, 14), (-56, 14), (-56, 108), (56, 108), (56, 14), (106, 14), (106, 8), (50, 8), (50, 102), (-50, 102), (-50, 8), align=None)
    extrude(amount=BOSS_EXTRUDE4_DEPTH, both=True)

    # Fillet1
    fillet1_edges = [part.edges().sort_by_distance(p)[0] for p in [
        (-50, 102, 0),
        (50, 102, 0),
        (106, 14, 0),
        (56, 14, 0),
        (56, 108, 0),
        (-56, 108, 0),
        (-56, 14, 0),
        (-106, 14, 0),
    ]]
    fillet(fillet1_edges, radius=FILLET1_R)


solid = part.part
